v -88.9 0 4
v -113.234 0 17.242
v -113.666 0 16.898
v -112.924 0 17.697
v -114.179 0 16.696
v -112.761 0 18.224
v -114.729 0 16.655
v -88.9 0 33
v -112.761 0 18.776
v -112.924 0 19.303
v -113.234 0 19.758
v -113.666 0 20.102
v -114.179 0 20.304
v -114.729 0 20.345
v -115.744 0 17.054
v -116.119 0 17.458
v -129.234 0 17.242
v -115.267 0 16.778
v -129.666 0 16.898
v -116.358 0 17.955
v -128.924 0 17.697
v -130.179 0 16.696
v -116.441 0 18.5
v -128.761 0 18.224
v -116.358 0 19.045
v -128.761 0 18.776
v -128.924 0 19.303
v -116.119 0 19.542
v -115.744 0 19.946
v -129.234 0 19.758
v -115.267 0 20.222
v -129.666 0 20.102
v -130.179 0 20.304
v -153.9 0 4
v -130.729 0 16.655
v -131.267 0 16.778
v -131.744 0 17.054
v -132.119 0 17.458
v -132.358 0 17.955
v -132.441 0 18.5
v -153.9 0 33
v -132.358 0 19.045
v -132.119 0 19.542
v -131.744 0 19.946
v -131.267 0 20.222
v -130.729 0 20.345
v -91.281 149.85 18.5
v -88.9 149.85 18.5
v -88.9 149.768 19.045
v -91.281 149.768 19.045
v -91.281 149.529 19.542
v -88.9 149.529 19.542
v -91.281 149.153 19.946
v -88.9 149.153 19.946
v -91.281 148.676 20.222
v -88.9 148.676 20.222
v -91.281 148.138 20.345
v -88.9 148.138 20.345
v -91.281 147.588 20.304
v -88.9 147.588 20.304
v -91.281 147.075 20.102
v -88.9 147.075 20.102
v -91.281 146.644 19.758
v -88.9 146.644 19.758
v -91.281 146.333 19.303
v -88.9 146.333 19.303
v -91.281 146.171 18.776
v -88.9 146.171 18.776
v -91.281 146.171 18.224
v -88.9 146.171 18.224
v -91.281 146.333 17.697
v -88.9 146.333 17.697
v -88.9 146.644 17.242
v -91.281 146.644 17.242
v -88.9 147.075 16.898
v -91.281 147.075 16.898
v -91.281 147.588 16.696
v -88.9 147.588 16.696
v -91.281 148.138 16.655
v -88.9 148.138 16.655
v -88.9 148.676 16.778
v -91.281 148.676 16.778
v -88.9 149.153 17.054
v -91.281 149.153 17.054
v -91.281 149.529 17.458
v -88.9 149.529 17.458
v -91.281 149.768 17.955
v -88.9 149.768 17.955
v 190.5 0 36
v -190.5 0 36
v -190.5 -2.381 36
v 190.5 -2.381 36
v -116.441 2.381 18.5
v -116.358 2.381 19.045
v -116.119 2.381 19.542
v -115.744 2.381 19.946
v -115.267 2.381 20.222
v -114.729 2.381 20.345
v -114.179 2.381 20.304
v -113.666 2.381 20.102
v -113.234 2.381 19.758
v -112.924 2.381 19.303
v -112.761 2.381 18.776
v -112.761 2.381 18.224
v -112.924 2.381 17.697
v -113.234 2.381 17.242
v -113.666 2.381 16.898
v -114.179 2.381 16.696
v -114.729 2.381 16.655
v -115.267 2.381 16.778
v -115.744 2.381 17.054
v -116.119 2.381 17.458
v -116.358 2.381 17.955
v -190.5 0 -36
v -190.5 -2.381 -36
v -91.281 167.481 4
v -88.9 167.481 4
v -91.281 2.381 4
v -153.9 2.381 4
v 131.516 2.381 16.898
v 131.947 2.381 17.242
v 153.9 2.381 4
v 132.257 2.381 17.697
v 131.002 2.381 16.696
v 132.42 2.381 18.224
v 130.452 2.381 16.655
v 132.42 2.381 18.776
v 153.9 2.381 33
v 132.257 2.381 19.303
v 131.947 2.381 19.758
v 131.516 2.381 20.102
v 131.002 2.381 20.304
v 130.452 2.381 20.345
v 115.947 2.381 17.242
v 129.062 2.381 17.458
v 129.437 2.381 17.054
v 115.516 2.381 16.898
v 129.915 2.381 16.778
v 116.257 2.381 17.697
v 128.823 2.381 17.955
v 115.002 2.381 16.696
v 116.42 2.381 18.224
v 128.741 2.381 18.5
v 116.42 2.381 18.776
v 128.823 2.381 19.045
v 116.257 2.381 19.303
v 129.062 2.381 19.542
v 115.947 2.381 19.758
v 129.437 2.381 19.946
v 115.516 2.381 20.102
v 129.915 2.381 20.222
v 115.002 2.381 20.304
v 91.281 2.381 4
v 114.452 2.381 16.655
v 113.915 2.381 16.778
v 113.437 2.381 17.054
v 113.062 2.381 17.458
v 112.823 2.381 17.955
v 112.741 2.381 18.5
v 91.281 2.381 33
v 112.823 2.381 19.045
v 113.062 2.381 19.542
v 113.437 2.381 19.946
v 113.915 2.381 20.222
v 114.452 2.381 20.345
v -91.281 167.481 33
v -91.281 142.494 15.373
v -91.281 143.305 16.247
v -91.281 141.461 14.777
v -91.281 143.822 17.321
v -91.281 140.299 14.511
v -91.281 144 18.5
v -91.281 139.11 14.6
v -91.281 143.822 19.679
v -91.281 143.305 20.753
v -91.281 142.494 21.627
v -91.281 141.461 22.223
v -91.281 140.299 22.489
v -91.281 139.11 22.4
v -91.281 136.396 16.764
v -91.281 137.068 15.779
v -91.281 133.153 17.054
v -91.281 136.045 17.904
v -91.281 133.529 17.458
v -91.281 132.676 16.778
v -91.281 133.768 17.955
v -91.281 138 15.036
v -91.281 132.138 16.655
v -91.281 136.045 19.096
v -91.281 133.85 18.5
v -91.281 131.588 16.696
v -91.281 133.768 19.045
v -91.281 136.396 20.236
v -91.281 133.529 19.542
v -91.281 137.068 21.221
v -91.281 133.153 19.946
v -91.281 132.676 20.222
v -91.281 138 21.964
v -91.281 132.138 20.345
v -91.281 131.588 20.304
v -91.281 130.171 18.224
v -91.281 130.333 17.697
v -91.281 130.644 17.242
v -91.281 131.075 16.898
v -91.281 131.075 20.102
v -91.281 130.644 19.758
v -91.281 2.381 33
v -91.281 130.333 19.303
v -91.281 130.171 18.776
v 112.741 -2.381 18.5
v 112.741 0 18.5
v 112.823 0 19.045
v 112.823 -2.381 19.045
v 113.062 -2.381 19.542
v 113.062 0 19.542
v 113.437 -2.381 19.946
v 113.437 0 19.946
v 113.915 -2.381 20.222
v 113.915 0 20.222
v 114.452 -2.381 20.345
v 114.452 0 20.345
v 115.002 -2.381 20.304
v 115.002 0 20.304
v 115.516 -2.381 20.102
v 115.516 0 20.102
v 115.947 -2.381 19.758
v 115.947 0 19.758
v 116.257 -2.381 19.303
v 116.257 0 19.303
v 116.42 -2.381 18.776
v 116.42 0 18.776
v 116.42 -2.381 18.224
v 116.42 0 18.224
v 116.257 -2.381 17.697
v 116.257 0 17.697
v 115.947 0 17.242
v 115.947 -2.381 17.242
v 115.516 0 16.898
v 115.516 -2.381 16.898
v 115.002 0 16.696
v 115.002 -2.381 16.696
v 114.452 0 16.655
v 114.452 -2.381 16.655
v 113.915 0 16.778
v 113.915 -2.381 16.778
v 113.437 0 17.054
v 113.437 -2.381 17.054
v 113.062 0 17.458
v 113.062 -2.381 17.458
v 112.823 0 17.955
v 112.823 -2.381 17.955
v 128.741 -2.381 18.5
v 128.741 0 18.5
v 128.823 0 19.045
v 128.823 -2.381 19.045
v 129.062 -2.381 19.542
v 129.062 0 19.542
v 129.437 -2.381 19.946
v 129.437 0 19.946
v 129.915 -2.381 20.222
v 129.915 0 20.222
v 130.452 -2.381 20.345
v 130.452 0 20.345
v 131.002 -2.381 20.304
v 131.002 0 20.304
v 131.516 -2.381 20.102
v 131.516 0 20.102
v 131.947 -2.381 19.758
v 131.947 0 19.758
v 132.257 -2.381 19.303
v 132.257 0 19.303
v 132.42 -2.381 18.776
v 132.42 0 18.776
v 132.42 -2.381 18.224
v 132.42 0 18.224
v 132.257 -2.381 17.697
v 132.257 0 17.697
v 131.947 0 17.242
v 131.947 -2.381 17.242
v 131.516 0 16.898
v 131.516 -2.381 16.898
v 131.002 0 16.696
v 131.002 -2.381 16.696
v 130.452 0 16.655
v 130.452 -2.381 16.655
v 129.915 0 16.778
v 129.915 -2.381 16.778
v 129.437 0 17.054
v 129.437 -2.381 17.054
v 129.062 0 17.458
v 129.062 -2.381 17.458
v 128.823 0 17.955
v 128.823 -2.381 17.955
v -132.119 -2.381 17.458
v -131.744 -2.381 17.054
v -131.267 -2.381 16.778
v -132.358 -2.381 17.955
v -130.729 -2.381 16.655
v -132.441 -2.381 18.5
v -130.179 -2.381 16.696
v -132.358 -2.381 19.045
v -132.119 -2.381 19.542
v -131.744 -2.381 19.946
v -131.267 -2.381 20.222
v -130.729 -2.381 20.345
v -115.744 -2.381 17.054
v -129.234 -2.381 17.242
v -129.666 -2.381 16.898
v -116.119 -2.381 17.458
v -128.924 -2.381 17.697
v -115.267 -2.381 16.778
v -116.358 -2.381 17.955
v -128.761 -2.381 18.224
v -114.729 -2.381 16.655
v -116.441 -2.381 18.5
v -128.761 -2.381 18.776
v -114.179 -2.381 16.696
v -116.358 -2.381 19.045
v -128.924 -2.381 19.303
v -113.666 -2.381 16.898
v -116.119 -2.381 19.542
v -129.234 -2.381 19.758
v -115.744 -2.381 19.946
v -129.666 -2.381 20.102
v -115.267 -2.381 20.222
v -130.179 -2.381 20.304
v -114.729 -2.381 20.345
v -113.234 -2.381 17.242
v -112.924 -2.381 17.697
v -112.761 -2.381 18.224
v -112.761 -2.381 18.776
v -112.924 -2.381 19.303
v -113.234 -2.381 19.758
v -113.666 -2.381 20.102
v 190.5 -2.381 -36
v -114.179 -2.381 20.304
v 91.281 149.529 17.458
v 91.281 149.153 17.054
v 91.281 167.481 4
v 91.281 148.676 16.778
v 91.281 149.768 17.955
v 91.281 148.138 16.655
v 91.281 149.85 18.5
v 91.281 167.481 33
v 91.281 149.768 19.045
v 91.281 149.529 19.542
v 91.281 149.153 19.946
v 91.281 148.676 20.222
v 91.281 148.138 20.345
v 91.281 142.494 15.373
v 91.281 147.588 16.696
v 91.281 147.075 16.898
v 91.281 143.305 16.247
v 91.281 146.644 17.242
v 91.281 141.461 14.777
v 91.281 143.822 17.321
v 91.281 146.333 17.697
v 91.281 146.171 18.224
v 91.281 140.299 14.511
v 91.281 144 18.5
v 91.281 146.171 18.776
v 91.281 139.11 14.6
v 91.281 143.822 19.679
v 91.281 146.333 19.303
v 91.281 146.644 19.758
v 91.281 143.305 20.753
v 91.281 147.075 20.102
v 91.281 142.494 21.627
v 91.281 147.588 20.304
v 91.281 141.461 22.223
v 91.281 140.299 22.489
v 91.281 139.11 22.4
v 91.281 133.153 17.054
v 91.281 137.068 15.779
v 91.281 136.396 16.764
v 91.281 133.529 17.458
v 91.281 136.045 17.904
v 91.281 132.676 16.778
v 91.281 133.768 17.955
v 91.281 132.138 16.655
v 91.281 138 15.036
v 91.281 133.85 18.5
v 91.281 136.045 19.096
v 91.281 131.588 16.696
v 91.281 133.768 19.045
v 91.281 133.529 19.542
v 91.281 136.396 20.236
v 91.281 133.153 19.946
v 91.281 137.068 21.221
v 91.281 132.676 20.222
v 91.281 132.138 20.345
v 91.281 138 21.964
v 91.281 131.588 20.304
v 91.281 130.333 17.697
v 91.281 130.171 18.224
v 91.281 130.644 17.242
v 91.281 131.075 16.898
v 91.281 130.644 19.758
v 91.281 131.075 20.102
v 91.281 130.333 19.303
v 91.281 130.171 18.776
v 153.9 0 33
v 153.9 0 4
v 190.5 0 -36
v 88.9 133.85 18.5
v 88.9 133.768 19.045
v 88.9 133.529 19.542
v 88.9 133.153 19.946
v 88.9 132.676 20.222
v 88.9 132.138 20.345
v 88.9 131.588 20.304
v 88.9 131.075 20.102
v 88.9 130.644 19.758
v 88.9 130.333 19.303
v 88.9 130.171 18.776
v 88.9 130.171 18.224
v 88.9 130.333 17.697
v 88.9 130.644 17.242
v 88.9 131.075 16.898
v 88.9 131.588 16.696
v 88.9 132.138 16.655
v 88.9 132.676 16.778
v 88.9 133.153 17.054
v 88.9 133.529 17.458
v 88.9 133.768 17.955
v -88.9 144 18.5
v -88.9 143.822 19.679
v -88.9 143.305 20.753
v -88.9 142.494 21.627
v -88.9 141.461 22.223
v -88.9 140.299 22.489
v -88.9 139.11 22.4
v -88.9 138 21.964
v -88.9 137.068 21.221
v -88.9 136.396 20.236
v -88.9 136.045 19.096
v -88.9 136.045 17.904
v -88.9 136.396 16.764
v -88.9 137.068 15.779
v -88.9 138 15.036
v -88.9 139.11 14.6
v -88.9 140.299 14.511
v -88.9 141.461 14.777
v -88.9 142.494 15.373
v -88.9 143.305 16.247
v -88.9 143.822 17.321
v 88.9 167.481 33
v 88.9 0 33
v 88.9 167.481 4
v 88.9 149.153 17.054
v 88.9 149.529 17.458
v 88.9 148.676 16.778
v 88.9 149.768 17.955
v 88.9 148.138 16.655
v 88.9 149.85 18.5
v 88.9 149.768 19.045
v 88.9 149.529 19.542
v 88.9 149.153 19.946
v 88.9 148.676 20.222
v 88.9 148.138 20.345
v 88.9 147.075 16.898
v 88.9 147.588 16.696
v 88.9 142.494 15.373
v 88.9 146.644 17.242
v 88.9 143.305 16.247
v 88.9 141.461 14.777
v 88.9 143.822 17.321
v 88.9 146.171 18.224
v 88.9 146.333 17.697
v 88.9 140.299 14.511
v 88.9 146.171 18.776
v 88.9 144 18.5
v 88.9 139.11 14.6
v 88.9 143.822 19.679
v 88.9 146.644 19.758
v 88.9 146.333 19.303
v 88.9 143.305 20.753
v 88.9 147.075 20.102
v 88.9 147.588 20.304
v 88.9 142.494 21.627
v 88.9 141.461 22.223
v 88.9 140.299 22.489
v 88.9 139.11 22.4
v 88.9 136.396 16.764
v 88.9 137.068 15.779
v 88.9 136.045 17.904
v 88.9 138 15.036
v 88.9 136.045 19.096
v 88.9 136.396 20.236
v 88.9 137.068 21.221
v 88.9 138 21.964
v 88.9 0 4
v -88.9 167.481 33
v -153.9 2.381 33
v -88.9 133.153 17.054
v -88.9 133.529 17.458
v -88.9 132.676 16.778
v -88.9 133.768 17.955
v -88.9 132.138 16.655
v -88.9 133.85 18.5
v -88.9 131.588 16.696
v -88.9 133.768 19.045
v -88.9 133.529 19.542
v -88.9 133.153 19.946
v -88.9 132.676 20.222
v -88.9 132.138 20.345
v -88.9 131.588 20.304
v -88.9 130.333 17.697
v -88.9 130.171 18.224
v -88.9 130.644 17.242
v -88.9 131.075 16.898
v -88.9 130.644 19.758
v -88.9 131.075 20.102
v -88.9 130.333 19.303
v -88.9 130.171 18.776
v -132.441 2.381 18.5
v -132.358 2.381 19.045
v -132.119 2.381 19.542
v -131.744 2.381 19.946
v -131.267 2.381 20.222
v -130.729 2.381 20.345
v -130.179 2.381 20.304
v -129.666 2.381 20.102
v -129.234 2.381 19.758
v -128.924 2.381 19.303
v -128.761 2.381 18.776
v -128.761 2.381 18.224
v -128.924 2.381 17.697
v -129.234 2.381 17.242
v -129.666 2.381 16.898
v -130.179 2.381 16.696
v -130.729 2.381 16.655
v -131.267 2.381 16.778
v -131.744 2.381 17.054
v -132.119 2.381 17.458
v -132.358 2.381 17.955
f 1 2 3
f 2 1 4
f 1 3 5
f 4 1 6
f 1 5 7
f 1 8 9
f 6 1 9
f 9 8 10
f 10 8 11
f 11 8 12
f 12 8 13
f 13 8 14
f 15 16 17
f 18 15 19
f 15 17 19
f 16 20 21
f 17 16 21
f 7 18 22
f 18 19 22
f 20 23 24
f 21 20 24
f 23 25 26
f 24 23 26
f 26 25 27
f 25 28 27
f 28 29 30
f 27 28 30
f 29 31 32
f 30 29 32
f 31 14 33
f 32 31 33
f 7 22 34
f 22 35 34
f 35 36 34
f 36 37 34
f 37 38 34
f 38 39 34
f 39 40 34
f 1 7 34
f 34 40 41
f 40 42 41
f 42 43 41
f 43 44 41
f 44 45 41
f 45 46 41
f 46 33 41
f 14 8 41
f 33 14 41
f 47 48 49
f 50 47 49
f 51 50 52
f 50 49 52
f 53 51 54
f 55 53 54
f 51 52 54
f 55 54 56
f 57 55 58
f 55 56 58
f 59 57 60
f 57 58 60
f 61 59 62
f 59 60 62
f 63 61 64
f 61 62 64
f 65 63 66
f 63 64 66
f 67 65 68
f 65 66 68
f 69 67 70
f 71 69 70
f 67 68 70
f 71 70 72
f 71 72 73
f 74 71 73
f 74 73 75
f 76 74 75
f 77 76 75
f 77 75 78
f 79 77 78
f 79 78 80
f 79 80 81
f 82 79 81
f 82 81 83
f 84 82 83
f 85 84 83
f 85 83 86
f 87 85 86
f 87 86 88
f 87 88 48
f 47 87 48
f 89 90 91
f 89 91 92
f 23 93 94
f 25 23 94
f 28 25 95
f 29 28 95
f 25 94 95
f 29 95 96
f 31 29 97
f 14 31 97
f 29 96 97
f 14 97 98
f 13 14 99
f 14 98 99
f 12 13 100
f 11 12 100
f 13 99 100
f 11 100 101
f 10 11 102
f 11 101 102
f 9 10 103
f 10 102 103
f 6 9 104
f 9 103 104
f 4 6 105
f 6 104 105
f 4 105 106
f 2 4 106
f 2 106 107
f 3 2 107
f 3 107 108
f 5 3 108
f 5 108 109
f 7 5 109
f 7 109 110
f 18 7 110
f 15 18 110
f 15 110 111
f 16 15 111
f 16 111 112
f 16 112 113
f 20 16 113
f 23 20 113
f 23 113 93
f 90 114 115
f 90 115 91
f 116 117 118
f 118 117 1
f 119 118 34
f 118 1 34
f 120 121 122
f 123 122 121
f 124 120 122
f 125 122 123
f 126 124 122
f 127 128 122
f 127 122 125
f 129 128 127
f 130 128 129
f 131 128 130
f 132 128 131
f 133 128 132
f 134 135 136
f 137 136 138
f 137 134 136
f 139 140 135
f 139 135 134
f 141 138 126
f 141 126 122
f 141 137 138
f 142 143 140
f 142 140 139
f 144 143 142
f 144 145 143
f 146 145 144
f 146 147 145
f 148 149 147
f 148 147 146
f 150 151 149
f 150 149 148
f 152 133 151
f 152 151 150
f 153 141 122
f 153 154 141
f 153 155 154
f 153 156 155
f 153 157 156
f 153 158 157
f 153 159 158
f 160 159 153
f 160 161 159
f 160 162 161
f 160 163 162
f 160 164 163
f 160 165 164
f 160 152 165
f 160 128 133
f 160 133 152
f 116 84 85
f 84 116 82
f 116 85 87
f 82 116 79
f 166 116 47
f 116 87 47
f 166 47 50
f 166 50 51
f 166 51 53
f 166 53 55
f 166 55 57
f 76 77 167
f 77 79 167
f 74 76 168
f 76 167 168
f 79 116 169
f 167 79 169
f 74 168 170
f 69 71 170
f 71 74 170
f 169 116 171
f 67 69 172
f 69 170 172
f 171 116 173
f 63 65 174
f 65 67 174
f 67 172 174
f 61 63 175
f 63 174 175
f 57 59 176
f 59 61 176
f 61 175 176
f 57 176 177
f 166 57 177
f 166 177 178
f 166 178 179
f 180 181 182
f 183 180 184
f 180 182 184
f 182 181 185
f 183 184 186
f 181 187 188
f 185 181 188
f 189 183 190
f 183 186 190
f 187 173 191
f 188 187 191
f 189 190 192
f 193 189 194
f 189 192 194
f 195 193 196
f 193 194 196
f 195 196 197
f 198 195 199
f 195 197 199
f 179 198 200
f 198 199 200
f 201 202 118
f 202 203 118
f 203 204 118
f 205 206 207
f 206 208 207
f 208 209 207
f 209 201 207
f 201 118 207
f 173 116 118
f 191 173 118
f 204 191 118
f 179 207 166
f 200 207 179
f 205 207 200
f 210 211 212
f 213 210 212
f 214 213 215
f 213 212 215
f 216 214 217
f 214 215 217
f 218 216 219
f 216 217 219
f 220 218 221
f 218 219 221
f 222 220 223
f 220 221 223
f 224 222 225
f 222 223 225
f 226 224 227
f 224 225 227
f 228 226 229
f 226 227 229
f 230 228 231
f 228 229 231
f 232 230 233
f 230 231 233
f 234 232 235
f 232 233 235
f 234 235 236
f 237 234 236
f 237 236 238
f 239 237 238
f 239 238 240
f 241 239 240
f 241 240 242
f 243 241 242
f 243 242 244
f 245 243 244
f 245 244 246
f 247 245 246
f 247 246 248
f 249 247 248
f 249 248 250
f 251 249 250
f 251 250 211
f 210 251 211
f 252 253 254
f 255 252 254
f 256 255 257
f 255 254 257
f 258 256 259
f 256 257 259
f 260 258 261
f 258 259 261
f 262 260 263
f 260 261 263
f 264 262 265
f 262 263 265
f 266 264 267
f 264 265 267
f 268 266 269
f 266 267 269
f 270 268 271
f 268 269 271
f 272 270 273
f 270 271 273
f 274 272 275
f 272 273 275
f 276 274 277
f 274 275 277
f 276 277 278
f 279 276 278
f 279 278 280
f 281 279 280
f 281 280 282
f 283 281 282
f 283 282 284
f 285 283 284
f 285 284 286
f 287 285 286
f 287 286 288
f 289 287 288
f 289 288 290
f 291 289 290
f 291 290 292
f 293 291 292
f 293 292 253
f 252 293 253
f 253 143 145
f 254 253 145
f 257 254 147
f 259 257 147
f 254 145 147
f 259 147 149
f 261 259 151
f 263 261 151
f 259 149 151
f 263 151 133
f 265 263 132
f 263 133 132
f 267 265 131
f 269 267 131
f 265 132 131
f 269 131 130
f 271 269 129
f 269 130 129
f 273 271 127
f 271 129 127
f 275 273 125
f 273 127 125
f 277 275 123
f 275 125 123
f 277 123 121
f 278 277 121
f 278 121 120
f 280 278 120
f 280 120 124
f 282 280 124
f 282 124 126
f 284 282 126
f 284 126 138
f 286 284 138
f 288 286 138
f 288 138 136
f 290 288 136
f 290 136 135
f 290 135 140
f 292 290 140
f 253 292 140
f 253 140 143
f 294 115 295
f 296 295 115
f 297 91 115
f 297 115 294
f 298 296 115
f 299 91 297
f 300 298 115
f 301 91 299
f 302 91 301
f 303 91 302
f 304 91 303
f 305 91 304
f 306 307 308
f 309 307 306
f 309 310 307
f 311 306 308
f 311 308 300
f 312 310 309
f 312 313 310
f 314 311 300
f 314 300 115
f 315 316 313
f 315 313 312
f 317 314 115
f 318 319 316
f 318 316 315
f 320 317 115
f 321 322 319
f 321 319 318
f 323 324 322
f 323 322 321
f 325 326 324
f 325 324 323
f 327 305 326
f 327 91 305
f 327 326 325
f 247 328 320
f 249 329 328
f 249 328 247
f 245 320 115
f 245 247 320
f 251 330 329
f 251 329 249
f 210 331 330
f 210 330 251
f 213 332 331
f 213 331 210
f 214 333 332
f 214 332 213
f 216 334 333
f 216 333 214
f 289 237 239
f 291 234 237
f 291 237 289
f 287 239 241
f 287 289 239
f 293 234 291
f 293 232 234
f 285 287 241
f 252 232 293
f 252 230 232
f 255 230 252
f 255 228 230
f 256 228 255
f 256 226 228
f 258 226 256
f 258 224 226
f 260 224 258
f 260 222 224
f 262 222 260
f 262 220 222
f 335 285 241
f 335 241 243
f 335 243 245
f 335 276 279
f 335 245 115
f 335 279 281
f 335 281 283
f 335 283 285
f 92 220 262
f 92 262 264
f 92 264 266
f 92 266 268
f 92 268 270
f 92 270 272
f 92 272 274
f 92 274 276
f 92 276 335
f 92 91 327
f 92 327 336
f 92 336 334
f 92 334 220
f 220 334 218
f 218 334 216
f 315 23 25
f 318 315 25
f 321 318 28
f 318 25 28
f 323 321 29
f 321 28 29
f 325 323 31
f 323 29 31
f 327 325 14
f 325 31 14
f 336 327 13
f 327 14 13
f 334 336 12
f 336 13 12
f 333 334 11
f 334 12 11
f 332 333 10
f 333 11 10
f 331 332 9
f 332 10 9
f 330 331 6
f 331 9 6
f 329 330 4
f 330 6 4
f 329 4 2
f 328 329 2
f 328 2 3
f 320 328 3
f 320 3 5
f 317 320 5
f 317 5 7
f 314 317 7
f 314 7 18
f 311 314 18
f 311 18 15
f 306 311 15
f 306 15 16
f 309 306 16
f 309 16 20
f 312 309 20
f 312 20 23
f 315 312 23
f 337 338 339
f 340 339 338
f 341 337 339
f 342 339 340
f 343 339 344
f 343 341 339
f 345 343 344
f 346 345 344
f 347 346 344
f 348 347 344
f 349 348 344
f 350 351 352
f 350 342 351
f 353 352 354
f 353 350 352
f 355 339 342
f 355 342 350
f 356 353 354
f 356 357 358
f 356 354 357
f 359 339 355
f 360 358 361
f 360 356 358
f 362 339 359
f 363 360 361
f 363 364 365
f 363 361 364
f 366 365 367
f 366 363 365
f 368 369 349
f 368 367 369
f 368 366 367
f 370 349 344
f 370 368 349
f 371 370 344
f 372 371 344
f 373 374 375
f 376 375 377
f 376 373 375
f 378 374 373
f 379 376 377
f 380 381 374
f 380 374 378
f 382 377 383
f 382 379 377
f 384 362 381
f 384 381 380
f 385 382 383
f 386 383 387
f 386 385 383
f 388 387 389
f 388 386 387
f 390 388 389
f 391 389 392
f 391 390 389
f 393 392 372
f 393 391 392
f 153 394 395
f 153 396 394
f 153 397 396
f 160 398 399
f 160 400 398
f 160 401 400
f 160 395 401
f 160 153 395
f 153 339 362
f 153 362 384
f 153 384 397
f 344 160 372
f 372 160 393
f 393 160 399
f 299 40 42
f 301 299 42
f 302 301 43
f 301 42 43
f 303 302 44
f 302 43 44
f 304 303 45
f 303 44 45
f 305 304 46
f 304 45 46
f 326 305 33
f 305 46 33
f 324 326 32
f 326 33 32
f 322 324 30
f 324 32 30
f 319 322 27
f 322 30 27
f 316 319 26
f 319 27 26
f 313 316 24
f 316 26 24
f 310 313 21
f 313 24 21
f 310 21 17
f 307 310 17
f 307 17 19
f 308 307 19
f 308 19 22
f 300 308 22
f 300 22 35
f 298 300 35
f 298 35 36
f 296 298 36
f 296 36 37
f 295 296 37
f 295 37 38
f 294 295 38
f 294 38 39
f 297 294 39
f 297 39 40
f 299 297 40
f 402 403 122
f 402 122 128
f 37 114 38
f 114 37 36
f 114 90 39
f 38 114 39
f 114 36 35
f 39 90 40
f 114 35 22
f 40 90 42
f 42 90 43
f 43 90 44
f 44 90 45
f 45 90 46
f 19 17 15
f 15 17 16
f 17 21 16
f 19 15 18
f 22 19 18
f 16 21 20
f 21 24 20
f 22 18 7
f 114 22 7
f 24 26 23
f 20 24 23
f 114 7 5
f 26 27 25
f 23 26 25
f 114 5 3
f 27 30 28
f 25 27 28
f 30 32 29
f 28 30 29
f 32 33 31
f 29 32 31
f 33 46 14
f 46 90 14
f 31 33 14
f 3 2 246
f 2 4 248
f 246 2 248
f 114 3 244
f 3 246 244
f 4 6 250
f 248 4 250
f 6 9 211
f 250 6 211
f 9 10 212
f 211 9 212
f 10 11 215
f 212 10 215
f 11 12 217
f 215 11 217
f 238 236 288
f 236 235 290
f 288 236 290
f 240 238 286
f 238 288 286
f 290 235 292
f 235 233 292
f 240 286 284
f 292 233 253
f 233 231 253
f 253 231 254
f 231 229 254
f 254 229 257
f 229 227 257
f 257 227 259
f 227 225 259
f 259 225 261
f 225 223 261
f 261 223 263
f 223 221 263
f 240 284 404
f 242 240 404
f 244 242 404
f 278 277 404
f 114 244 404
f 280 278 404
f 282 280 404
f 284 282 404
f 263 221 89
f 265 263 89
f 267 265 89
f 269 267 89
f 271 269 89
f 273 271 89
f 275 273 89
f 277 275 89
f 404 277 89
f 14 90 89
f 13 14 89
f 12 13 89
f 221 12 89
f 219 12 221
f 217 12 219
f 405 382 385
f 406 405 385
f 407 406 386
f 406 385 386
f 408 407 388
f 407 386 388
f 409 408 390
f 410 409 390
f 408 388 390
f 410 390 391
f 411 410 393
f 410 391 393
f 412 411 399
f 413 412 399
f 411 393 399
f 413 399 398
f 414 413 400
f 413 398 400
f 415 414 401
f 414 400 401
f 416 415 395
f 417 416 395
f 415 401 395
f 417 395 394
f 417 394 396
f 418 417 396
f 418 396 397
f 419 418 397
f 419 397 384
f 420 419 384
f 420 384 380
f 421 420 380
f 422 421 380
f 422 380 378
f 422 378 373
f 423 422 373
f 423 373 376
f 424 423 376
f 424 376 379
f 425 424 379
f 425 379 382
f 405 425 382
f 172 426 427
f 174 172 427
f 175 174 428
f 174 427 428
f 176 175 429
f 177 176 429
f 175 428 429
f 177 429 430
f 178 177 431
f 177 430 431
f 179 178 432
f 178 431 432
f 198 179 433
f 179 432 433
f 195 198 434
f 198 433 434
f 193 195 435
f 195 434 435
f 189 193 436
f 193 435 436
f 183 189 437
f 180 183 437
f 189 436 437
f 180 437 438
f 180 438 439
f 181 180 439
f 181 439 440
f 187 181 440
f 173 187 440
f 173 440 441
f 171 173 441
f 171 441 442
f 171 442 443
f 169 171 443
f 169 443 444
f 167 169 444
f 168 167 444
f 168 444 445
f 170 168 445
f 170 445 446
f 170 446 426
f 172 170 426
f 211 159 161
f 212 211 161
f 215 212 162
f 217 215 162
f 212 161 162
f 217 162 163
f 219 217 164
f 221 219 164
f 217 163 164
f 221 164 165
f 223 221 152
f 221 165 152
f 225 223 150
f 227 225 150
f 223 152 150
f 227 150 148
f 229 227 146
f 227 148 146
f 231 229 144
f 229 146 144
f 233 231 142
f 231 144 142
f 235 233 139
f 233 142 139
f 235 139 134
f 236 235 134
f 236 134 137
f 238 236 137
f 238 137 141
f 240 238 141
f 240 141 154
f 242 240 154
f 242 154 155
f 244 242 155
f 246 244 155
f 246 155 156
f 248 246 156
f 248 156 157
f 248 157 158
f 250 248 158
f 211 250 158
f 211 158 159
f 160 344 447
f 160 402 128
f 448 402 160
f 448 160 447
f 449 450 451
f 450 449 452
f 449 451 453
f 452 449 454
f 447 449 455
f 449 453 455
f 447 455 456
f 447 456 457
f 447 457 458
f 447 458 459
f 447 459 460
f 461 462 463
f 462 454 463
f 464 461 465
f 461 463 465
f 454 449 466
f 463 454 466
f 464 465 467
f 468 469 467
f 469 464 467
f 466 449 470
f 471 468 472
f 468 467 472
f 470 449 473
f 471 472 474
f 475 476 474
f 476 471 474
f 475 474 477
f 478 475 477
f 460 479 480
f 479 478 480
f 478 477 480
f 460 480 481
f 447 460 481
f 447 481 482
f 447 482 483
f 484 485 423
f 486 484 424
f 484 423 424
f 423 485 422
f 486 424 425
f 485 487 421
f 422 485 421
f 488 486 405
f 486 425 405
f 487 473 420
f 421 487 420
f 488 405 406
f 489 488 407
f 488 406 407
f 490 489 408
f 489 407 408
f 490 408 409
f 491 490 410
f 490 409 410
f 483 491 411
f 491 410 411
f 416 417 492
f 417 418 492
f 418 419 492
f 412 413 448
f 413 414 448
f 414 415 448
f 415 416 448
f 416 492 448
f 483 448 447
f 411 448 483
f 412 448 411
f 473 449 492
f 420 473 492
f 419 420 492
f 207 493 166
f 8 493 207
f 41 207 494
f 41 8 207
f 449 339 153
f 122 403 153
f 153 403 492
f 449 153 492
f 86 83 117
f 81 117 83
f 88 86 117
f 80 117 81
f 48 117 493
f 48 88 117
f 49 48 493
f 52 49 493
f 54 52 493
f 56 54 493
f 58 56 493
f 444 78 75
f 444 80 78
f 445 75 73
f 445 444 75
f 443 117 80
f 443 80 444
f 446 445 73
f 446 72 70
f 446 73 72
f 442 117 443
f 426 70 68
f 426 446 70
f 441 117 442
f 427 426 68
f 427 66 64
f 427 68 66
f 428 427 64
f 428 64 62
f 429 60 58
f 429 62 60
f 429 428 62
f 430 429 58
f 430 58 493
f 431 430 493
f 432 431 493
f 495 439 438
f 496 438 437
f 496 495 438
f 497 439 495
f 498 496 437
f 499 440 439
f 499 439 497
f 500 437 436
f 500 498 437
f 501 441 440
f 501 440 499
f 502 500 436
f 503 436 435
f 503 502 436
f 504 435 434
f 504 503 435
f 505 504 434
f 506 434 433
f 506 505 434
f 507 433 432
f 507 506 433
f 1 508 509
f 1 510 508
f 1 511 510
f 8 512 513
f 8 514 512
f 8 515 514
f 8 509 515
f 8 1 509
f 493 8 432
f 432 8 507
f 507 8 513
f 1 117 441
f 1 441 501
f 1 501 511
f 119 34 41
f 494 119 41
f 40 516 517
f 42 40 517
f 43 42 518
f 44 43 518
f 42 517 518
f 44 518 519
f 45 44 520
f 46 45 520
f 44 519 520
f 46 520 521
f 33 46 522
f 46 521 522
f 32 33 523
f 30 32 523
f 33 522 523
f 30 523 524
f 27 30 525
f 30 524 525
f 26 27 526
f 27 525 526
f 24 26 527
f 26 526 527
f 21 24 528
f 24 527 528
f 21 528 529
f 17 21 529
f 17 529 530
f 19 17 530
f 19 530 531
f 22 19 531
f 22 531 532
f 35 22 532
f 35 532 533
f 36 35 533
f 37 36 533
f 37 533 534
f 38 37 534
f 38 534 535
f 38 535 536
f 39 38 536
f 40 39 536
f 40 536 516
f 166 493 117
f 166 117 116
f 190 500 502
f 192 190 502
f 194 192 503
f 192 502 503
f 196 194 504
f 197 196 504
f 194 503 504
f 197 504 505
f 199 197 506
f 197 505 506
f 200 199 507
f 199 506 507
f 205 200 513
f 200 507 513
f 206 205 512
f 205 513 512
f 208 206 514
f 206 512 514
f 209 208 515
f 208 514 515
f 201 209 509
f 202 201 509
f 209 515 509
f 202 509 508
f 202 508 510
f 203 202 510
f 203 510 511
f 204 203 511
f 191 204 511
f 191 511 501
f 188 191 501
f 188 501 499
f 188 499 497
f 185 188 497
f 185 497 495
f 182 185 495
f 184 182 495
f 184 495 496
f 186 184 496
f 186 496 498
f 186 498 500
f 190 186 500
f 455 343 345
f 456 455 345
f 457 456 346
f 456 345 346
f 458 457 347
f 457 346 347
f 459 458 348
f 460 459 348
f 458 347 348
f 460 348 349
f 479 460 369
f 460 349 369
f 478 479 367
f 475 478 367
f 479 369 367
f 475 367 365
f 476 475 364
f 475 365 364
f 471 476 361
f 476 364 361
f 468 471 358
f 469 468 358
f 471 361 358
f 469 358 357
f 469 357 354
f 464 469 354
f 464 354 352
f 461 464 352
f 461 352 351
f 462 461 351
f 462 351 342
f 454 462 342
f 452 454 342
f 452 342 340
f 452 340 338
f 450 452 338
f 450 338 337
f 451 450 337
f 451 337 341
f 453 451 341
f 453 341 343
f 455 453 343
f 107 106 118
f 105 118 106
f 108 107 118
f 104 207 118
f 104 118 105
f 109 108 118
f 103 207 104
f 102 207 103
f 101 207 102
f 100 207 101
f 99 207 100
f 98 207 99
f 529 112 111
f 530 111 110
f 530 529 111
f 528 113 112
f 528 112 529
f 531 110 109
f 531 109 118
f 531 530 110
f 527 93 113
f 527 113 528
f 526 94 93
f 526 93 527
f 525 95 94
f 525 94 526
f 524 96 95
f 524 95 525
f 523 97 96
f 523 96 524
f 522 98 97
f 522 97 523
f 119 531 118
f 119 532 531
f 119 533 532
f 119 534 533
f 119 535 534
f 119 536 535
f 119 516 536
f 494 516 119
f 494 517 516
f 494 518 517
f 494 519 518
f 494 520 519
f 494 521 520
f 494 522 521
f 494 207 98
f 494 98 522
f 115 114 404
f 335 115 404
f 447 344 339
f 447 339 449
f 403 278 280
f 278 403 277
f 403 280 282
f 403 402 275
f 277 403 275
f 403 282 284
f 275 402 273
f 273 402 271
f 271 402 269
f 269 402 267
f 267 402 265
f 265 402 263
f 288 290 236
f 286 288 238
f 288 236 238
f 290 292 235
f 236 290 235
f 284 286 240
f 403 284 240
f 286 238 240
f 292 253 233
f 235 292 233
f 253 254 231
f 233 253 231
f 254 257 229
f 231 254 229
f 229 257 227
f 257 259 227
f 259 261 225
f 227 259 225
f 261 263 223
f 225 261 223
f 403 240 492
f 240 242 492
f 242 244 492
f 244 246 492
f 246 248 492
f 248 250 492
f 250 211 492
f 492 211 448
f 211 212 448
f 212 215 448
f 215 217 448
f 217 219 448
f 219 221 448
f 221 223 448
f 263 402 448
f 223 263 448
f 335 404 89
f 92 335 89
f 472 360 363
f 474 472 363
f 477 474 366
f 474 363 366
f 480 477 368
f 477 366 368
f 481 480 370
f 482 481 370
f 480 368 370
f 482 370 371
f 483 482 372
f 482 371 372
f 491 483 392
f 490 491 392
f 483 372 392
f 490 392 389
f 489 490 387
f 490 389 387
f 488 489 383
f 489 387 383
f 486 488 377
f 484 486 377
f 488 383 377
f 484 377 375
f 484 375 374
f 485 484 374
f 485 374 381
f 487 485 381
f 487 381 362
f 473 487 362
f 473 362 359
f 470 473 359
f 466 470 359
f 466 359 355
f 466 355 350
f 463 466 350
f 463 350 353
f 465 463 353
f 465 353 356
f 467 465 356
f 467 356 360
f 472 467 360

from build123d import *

# Parameters (mm, degrees)
F0_W     = 381
F0_H     = 72
F1_DEPTH = 2.38125
F2_W     = 65
F2_H     = 29
F3_DEPTH = 2.38125
F4_W     = 2.38125
F4_H     = 29
F5_DEPTH = 165.1
F6_R     = 1.85
F7_DEPTH = 25
F8_R     = 1.85
F8_R_2   = 4
F9_DEPTH = 293.97204


with BuildPart() as f1:
    # F0 (on Front) → F1 (new body)
    with BuildSketch(Plane.XZ):
        Rectangle(F0_W, F0_H)
    extrude(amount=F1_DEPTH)


with BuildPart() as f3:
    # F2 (on face) → F3 (new body)
    with BuildSketch(Plane(origin=(0, 0, 0), x_dir=(-1, 0, 0), z_dir=(0, 1, 0))):
        with Locations((-121.4, 18.5)):
            Rectangle(F2_W, F2_H)
        with Locations((121.4, 18.5)):
            Rectangle(F2_W, F2_H)
    extrude(amount=F3_DEPTH)

    # F4 (on face) → F5 (join)
    with BuildSketch(Plane(origin=(0, 2.38125, 0), x_dir=(-1, 0, 0), z_dir=(0, 1, 0))):
        with Locations((-90.090625, 18.5)):
            Rectangle(F4_W, F4_H)
        with Locations((90.090625, 18.5)):
            Rectangle(F4_W, F4_H)
    extrude(amount=F5_DEPTH)


with BuildPart() as f7_tool:
    # F6 (on face) → F7 (new body)
    with BuildSketch(Plane(origin=(0, 2.38125, 0), x_dir=(-1, 0, 0), z_dir=(0, 1, 0))):
        with Locations((-130.590625, 18.5)):
            Circle(F6_R)
        with Locations((-114.590625, 18.5)):
            Circle(F6_R)
        with Locations((130.590625, 18.5)):
            Circle(F6_R)
        with Locations((114.590625, 18.5)):
            Circle(F6_R)
    extrude(amount=-F7_DEPTH)


with BuildPart() as f1_1:
    add(f1.part)

    # F7: cut by f7_tool
    add(f7_tool.part, mode=Mode.SUBTRACT)


with BuildPart() as f3_1:
    add(f3.part)

    # F7: cut by f7_tool
    add(f7_tool.part, mode=Mode.SUBTRACT)

    # F8 (on face) → F9 (cut)
    with BuildSketch(Plane.YZ.offset(91.28125)):
        with Locations((148, 18.5)):
            Circle(F8_R)
        with Locations((132, 18.5)):
            Circle(F8_R)
        with Locations((140, 18.5)):
            Circle(F8_R_2)
    extrude(amount=-F9_DEPTH, mode=Mode.SUBTRACT)


solid = Compound([f1_1.part, f3_1.part])
